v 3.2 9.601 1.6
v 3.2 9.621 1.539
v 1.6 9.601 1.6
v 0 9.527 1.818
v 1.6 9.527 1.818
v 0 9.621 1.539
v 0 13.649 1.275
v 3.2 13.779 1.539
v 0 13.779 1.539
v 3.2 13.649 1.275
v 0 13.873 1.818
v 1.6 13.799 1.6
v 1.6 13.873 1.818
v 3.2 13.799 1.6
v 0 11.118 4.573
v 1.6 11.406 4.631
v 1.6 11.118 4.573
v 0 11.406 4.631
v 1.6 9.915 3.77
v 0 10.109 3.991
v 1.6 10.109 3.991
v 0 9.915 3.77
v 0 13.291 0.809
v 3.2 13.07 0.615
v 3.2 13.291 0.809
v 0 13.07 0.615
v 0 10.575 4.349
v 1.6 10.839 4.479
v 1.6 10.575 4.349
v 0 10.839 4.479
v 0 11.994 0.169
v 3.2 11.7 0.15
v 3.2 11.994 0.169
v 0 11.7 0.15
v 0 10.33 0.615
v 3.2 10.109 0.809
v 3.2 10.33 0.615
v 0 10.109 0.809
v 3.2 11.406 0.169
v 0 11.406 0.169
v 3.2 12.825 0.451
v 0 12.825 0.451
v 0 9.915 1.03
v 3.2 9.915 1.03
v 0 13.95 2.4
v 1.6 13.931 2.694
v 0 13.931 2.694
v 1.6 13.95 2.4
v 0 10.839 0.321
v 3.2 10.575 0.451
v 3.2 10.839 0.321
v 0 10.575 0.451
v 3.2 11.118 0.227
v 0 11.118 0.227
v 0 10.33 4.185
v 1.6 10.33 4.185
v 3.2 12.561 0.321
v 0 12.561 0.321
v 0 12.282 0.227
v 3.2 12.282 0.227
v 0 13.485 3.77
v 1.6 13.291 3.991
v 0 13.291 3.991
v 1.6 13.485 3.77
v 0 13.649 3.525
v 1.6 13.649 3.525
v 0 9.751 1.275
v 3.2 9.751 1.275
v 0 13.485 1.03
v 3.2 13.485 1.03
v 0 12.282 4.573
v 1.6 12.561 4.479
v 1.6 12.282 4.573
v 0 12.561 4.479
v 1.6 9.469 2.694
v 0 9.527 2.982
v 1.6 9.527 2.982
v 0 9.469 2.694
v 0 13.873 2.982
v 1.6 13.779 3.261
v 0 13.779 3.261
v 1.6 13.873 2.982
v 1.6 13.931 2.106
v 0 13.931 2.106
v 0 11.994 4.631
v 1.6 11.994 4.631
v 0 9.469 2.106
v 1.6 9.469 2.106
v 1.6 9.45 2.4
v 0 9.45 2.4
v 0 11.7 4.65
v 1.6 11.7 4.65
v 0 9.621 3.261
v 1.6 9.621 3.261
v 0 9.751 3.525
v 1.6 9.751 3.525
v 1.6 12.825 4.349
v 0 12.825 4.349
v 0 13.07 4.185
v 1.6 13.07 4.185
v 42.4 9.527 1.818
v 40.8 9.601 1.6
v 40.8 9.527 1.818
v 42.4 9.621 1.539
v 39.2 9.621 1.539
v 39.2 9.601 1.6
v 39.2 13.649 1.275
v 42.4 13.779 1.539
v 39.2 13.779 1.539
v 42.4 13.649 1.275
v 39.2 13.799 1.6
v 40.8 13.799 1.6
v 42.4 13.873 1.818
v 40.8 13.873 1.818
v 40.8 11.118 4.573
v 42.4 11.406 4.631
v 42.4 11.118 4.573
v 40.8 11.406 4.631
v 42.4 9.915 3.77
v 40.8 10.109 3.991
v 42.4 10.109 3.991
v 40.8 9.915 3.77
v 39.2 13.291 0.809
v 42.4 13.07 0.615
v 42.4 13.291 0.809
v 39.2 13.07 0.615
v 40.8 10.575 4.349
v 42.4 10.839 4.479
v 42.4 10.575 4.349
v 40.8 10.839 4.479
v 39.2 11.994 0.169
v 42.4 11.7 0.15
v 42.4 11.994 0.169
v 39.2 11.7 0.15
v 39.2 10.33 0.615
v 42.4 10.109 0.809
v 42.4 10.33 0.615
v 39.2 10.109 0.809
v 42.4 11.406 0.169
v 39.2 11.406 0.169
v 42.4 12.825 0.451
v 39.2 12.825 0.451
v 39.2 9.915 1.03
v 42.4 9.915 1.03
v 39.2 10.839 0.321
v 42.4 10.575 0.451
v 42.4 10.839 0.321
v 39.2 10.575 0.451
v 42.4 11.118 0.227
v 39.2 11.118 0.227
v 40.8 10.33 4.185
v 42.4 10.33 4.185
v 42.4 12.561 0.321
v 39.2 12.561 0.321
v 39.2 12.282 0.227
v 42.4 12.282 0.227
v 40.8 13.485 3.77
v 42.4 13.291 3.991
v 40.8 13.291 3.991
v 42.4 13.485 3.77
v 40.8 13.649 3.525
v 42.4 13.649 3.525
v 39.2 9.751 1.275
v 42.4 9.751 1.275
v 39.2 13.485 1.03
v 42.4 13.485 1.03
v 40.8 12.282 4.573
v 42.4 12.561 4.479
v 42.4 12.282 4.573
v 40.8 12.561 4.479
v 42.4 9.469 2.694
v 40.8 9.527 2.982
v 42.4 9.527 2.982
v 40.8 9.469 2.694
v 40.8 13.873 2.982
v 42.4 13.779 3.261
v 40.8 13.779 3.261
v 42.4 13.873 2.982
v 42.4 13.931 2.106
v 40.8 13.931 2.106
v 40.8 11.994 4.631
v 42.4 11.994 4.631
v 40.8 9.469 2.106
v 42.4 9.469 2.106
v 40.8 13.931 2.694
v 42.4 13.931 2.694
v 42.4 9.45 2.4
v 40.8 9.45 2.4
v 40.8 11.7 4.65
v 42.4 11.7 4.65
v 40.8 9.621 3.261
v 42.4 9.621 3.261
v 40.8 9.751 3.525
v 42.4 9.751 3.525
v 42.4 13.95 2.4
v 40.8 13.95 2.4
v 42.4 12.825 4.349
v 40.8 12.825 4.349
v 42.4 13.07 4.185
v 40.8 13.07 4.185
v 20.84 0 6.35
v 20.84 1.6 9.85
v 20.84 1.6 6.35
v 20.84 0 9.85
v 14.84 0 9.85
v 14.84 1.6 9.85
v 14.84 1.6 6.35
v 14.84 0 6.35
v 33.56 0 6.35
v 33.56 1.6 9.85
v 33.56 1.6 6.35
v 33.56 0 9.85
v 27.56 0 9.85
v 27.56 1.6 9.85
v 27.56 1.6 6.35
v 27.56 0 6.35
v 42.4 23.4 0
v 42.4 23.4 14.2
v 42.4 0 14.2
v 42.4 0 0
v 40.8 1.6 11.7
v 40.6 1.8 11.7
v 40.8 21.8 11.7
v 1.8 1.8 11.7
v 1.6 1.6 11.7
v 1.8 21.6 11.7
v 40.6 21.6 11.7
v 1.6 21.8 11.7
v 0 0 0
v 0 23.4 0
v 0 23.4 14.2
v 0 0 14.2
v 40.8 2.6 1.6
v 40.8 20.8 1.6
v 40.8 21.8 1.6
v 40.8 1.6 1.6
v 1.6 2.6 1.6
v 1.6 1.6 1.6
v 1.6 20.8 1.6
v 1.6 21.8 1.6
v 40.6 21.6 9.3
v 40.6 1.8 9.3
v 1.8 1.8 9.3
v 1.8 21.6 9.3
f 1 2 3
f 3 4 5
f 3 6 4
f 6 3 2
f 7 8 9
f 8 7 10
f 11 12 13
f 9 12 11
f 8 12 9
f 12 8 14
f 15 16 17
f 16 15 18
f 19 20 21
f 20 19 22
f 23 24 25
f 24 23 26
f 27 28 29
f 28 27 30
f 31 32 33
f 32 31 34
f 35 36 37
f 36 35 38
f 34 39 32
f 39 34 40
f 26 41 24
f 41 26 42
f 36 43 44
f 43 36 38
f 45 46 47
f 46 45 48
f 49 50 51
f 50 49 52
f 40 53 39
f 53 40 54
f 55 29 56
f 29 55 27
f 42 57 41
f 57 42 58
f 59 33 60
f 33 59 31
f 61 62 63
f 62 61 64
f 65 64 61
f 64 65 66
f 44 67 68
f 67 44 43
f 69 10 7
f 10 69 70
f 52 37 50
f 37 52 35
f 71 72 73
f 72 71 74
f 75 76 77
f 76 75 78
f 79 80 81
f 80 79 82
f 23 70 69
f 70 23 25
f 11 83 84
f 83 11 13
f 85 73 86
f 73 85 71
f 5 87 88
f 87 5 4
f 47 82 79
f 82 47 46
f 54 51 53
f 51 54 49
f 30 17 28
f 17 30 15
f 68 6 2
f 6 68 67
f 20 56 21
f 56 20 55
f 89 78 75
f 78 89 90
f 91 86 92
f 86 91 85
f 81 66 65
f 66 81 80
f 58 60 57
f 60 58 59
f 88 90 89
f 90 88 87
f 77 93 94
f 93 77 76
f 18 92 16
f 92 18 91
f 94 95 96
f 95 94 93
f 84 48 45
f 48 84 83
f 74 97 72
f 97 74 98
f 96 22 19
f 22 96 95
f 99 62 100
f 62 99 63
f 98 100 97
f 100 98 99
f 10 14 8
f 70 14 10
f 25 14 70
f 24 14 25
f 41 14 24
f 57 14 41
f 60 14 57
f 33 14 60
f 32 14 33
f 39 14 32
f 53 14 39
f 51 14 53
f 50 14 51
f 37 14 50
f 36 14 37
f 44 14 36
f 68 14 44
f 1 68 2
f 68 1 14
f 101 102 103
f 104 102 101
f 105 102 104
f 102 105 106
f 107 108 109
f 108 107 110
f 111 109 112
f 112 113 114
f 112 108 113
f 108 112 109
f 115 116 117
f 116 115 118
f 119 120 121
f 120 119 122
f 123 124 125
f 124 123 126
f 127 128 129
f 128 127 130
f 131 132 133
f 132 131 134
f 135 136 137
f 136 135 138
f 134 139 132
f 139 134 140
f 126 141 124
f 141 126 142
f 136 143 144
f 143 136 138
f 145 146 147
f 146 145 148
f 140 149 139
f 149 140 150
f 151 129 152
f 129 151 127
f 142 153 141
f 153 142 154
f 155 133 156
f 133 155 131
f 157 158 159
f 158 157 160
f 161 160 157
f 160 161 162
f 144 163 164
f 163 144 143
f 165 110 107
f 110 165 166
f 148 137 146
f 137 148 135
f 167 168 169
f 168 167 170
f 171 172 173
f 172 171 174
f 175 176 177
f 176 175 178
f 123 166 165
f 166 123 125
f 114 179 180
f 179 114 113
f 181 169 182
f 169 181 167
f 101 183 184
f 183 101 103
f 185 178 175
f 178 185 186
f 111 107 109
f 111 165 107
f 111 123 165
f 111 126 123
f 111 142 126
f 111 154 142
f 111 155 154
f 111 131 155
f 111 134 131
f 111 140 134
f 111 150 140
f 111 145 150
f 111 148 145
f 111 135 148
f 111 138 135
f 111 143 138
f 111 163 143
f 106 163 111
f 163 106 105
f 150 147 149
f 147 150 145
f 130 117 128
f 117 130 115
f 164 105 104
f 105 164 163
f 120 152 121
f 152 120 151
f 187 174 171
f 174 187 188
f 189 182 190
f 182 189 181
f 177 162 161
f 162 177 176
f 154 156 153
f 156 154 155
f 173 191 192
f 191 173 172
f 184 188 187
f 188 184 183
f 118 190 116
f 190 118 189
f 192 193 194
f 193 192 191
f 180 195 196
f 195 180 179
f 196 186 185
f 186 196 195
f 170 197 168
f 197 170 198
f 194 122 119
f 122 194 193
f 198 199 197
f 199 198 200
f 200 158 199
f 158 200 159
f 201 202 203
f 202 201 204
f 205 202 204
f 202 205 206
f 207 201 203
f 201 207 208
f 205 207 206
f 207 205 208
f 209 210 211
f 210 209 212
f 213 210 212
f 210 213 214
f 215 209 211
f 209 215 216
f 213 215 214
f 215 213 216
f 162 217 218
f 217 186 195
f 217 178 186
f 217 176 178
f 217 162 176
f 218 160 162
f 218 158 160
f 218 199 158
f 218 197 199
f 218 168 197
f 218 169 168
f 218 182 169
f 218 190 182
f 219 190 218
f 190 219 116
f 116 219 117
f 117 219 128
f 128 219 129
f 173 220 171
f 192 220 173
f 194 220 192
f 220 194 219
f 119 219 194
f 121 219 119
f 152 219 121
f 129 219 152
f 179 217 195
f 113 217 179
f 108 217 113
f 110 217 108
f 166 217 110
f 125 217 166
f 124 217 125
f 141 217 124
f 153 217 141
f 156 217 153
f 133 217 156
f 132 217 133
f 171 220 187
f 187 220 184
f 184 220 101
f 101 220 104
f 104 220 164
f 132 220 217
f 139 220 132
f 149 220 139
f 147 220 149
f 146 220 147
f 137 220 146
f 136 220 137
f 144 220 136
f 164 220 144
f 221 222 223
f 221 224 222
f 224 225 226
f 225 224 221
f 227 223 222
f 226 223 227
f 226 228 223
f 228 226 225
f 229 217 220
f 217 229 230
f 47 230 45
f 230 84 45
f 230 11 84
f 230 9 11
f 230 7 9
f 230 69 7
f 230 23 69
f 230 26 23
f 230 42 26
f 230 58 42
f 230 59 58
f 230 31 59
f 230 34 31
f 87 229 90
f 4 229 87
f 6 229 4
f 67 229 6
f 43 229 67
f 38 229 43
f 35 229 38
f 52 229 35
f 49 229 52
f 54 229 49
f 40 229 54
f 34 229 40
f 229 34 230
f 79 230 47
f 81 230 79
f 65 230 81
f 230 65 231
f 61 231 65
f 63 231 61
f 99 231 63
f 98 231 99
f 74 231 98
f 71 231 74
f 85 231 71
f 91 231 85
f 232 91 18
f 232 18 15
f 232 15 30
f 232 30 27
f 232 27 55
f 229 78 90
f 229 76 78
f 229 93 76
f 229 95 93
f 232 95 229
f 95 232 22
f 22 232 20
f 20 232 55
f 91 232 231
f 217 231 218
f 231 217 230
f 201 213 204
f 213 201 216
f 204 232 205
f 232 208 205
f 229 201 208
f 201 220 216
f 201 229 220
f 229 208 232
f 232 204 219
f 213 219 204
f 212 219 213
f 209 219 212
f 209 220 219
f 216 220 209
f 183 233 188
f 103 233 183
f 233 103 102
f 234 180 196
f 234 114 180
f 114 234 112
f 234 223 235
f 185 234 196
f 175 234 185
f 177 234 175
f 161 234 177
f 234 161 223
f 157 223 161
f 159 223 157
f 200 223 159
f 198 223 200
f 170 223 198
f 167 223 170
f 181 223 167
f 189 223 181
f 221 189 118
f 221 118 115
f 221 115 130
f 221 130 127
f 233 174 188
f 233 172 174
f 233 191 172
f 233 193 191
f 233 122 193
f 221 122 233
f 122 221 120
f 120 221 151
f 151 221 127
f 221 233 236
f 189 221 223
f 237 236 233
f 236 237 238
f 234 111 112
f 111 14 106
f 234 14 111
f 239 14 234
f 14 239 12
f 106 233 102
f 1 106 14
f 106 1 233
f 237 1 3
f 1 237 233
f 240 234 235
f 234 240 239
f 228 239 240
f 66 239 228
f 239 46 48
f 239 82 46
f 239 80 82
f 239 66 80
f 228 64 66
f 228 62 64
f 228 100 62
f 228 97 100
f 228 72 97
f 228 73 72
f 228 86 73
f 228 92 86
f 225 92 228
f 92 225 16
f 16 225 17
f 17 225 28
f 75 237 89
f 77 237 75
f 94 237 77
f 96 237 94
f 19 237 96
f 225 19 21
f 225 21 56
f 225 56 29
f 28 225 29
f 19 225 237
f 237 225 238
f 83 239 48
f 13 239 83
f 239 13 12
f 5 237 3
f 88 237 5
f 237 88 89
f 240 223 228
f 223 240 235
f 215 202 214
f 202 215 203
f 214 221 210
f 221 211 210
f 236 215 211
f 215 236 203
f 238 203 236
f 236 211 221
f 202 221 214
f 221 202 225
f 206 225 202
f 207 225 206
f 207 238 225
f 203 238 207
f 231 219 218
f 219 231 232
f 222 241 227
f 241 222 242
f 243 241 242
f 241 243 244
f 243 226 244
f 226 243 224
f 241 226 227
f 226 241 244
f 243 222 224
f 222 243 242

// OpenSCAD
// zeeho_vci_case.scad — RS485/BLE 诊断模块保护外壳（参数化，3D 打印）
// 用法（OpenSCAD）：改下面参数 → F5 预览 → F6 渲染 → File → Export → STL
// 没有 3D 打印机：导出 STL 后淘宝搜「3D 打印代打」，上传文件，几块钱出件
// 适配模块：I6328A-485（BLE 主从一体）等同类小板；也可改参数用于 ESP32 CAN 桥

/* [显示] 0=底壳+盖（装配预览） 1=只显示底壳 2=只显示盖 */
view_mode = 0;

/* [模块实测尺寸（到货后用卡尺量，单位 mm）] */
board_l = 38;    // 板长（不含排针）
board_w = 19;    // 板宽
board_t = 1.6;   // 板厚
comp_h  = 7;     // 板上元件最高处（留足高度，天线区别贴金属）

/* [外壳参数] */
wall    = 1.6;   // 壁厚
clear   = 0.6;   // 板与壳的间隙（装配松量）
lid_h   = 2.5;   // 盖板厚度

/* [出线孔] 两端各一个，A/B 与 VCC/GND 从两端出 */
wire_hole_d = 4.5;   // 出线孔直径
wire_hole_z = 0;     // 出线孔中心相对板面高度（0=贴板面）

$fn = 48;

inner_l = board_l + 2 * clear;
inner_w = board_w + 2 * clear;
outer_l = inner_l + 2 * wall;
outer_w = inner_w + 2 * wall;
body_h  = wall + board_t + comp_h + 1.5;   // 底壳总高（底 + 板 + 元件 + 余量）

// ---------- 底壳 ----------
module shell_bottom() {
    difference() {
        cube([outer_l, outer_w, body_h]);
        // 内腔
        translate([wall, wall, wall])
            cube([inner_l, inner_w, body_h]);
        // 两端出线孔（沿长边两端，中心在板面附近）
        for (x = [0, outer_l]) {
            translate([x, outer_w / 2, wall + board_t / 2 + wire_hole_z])
                rotate([0, 90, 0])
                    cylinder(d = wire_hole_d, h = wall * 4, center = true);
        }
        // 侧面散热/透传观察窗（可选，两个小方孔）
        for (x = [outer_l * 0.35, outer_l * 0.65]) {
            translate([x, -1, wall + board_t + comp_h * 0.45])
                cube([6, wall + 2, comp_h * 0.5]);
        }
    }
    // 四角支撑柱（把板垫平：板放在 wall 高度的台阶上，简化为两侧托边）
    translate([wall + 0.0, wall + 0.0, wall - 0.8])
        cube([inner_l, 1.0, 0.8]);
    translate([wall + 0.0, wall + inner_w - 1.0, wall - 0.8])
        cube([inner_l, 1.0, 0.8]);
}

// ---------- 盖（套合，免螺丝） ----------
module lid() {
    // 顶板
    translate([0, 0, body_h])
        cube([outer_l, outer_w, lid_h]);
    // 插入唇（进入底壳内腔，摩擦固定）
    translate([wall + 0.2, wall + 0.2, body_h - 2.4])
        cube([inner_l - 0.4, inner_w - 0.4, 2.4]);
}

// ---------- 输出 ----------
if (view_mode == 0) {
    shell_bottom();
    lid();
    // 装配预览：把盖抬起来一点看装配关系（注释掉下面这行即为闭合状态）
    // translate([0, 0, 8]) lid();
}
if (view_mode == 1) shell_bottom();
if (view_mode == 2) lid();
